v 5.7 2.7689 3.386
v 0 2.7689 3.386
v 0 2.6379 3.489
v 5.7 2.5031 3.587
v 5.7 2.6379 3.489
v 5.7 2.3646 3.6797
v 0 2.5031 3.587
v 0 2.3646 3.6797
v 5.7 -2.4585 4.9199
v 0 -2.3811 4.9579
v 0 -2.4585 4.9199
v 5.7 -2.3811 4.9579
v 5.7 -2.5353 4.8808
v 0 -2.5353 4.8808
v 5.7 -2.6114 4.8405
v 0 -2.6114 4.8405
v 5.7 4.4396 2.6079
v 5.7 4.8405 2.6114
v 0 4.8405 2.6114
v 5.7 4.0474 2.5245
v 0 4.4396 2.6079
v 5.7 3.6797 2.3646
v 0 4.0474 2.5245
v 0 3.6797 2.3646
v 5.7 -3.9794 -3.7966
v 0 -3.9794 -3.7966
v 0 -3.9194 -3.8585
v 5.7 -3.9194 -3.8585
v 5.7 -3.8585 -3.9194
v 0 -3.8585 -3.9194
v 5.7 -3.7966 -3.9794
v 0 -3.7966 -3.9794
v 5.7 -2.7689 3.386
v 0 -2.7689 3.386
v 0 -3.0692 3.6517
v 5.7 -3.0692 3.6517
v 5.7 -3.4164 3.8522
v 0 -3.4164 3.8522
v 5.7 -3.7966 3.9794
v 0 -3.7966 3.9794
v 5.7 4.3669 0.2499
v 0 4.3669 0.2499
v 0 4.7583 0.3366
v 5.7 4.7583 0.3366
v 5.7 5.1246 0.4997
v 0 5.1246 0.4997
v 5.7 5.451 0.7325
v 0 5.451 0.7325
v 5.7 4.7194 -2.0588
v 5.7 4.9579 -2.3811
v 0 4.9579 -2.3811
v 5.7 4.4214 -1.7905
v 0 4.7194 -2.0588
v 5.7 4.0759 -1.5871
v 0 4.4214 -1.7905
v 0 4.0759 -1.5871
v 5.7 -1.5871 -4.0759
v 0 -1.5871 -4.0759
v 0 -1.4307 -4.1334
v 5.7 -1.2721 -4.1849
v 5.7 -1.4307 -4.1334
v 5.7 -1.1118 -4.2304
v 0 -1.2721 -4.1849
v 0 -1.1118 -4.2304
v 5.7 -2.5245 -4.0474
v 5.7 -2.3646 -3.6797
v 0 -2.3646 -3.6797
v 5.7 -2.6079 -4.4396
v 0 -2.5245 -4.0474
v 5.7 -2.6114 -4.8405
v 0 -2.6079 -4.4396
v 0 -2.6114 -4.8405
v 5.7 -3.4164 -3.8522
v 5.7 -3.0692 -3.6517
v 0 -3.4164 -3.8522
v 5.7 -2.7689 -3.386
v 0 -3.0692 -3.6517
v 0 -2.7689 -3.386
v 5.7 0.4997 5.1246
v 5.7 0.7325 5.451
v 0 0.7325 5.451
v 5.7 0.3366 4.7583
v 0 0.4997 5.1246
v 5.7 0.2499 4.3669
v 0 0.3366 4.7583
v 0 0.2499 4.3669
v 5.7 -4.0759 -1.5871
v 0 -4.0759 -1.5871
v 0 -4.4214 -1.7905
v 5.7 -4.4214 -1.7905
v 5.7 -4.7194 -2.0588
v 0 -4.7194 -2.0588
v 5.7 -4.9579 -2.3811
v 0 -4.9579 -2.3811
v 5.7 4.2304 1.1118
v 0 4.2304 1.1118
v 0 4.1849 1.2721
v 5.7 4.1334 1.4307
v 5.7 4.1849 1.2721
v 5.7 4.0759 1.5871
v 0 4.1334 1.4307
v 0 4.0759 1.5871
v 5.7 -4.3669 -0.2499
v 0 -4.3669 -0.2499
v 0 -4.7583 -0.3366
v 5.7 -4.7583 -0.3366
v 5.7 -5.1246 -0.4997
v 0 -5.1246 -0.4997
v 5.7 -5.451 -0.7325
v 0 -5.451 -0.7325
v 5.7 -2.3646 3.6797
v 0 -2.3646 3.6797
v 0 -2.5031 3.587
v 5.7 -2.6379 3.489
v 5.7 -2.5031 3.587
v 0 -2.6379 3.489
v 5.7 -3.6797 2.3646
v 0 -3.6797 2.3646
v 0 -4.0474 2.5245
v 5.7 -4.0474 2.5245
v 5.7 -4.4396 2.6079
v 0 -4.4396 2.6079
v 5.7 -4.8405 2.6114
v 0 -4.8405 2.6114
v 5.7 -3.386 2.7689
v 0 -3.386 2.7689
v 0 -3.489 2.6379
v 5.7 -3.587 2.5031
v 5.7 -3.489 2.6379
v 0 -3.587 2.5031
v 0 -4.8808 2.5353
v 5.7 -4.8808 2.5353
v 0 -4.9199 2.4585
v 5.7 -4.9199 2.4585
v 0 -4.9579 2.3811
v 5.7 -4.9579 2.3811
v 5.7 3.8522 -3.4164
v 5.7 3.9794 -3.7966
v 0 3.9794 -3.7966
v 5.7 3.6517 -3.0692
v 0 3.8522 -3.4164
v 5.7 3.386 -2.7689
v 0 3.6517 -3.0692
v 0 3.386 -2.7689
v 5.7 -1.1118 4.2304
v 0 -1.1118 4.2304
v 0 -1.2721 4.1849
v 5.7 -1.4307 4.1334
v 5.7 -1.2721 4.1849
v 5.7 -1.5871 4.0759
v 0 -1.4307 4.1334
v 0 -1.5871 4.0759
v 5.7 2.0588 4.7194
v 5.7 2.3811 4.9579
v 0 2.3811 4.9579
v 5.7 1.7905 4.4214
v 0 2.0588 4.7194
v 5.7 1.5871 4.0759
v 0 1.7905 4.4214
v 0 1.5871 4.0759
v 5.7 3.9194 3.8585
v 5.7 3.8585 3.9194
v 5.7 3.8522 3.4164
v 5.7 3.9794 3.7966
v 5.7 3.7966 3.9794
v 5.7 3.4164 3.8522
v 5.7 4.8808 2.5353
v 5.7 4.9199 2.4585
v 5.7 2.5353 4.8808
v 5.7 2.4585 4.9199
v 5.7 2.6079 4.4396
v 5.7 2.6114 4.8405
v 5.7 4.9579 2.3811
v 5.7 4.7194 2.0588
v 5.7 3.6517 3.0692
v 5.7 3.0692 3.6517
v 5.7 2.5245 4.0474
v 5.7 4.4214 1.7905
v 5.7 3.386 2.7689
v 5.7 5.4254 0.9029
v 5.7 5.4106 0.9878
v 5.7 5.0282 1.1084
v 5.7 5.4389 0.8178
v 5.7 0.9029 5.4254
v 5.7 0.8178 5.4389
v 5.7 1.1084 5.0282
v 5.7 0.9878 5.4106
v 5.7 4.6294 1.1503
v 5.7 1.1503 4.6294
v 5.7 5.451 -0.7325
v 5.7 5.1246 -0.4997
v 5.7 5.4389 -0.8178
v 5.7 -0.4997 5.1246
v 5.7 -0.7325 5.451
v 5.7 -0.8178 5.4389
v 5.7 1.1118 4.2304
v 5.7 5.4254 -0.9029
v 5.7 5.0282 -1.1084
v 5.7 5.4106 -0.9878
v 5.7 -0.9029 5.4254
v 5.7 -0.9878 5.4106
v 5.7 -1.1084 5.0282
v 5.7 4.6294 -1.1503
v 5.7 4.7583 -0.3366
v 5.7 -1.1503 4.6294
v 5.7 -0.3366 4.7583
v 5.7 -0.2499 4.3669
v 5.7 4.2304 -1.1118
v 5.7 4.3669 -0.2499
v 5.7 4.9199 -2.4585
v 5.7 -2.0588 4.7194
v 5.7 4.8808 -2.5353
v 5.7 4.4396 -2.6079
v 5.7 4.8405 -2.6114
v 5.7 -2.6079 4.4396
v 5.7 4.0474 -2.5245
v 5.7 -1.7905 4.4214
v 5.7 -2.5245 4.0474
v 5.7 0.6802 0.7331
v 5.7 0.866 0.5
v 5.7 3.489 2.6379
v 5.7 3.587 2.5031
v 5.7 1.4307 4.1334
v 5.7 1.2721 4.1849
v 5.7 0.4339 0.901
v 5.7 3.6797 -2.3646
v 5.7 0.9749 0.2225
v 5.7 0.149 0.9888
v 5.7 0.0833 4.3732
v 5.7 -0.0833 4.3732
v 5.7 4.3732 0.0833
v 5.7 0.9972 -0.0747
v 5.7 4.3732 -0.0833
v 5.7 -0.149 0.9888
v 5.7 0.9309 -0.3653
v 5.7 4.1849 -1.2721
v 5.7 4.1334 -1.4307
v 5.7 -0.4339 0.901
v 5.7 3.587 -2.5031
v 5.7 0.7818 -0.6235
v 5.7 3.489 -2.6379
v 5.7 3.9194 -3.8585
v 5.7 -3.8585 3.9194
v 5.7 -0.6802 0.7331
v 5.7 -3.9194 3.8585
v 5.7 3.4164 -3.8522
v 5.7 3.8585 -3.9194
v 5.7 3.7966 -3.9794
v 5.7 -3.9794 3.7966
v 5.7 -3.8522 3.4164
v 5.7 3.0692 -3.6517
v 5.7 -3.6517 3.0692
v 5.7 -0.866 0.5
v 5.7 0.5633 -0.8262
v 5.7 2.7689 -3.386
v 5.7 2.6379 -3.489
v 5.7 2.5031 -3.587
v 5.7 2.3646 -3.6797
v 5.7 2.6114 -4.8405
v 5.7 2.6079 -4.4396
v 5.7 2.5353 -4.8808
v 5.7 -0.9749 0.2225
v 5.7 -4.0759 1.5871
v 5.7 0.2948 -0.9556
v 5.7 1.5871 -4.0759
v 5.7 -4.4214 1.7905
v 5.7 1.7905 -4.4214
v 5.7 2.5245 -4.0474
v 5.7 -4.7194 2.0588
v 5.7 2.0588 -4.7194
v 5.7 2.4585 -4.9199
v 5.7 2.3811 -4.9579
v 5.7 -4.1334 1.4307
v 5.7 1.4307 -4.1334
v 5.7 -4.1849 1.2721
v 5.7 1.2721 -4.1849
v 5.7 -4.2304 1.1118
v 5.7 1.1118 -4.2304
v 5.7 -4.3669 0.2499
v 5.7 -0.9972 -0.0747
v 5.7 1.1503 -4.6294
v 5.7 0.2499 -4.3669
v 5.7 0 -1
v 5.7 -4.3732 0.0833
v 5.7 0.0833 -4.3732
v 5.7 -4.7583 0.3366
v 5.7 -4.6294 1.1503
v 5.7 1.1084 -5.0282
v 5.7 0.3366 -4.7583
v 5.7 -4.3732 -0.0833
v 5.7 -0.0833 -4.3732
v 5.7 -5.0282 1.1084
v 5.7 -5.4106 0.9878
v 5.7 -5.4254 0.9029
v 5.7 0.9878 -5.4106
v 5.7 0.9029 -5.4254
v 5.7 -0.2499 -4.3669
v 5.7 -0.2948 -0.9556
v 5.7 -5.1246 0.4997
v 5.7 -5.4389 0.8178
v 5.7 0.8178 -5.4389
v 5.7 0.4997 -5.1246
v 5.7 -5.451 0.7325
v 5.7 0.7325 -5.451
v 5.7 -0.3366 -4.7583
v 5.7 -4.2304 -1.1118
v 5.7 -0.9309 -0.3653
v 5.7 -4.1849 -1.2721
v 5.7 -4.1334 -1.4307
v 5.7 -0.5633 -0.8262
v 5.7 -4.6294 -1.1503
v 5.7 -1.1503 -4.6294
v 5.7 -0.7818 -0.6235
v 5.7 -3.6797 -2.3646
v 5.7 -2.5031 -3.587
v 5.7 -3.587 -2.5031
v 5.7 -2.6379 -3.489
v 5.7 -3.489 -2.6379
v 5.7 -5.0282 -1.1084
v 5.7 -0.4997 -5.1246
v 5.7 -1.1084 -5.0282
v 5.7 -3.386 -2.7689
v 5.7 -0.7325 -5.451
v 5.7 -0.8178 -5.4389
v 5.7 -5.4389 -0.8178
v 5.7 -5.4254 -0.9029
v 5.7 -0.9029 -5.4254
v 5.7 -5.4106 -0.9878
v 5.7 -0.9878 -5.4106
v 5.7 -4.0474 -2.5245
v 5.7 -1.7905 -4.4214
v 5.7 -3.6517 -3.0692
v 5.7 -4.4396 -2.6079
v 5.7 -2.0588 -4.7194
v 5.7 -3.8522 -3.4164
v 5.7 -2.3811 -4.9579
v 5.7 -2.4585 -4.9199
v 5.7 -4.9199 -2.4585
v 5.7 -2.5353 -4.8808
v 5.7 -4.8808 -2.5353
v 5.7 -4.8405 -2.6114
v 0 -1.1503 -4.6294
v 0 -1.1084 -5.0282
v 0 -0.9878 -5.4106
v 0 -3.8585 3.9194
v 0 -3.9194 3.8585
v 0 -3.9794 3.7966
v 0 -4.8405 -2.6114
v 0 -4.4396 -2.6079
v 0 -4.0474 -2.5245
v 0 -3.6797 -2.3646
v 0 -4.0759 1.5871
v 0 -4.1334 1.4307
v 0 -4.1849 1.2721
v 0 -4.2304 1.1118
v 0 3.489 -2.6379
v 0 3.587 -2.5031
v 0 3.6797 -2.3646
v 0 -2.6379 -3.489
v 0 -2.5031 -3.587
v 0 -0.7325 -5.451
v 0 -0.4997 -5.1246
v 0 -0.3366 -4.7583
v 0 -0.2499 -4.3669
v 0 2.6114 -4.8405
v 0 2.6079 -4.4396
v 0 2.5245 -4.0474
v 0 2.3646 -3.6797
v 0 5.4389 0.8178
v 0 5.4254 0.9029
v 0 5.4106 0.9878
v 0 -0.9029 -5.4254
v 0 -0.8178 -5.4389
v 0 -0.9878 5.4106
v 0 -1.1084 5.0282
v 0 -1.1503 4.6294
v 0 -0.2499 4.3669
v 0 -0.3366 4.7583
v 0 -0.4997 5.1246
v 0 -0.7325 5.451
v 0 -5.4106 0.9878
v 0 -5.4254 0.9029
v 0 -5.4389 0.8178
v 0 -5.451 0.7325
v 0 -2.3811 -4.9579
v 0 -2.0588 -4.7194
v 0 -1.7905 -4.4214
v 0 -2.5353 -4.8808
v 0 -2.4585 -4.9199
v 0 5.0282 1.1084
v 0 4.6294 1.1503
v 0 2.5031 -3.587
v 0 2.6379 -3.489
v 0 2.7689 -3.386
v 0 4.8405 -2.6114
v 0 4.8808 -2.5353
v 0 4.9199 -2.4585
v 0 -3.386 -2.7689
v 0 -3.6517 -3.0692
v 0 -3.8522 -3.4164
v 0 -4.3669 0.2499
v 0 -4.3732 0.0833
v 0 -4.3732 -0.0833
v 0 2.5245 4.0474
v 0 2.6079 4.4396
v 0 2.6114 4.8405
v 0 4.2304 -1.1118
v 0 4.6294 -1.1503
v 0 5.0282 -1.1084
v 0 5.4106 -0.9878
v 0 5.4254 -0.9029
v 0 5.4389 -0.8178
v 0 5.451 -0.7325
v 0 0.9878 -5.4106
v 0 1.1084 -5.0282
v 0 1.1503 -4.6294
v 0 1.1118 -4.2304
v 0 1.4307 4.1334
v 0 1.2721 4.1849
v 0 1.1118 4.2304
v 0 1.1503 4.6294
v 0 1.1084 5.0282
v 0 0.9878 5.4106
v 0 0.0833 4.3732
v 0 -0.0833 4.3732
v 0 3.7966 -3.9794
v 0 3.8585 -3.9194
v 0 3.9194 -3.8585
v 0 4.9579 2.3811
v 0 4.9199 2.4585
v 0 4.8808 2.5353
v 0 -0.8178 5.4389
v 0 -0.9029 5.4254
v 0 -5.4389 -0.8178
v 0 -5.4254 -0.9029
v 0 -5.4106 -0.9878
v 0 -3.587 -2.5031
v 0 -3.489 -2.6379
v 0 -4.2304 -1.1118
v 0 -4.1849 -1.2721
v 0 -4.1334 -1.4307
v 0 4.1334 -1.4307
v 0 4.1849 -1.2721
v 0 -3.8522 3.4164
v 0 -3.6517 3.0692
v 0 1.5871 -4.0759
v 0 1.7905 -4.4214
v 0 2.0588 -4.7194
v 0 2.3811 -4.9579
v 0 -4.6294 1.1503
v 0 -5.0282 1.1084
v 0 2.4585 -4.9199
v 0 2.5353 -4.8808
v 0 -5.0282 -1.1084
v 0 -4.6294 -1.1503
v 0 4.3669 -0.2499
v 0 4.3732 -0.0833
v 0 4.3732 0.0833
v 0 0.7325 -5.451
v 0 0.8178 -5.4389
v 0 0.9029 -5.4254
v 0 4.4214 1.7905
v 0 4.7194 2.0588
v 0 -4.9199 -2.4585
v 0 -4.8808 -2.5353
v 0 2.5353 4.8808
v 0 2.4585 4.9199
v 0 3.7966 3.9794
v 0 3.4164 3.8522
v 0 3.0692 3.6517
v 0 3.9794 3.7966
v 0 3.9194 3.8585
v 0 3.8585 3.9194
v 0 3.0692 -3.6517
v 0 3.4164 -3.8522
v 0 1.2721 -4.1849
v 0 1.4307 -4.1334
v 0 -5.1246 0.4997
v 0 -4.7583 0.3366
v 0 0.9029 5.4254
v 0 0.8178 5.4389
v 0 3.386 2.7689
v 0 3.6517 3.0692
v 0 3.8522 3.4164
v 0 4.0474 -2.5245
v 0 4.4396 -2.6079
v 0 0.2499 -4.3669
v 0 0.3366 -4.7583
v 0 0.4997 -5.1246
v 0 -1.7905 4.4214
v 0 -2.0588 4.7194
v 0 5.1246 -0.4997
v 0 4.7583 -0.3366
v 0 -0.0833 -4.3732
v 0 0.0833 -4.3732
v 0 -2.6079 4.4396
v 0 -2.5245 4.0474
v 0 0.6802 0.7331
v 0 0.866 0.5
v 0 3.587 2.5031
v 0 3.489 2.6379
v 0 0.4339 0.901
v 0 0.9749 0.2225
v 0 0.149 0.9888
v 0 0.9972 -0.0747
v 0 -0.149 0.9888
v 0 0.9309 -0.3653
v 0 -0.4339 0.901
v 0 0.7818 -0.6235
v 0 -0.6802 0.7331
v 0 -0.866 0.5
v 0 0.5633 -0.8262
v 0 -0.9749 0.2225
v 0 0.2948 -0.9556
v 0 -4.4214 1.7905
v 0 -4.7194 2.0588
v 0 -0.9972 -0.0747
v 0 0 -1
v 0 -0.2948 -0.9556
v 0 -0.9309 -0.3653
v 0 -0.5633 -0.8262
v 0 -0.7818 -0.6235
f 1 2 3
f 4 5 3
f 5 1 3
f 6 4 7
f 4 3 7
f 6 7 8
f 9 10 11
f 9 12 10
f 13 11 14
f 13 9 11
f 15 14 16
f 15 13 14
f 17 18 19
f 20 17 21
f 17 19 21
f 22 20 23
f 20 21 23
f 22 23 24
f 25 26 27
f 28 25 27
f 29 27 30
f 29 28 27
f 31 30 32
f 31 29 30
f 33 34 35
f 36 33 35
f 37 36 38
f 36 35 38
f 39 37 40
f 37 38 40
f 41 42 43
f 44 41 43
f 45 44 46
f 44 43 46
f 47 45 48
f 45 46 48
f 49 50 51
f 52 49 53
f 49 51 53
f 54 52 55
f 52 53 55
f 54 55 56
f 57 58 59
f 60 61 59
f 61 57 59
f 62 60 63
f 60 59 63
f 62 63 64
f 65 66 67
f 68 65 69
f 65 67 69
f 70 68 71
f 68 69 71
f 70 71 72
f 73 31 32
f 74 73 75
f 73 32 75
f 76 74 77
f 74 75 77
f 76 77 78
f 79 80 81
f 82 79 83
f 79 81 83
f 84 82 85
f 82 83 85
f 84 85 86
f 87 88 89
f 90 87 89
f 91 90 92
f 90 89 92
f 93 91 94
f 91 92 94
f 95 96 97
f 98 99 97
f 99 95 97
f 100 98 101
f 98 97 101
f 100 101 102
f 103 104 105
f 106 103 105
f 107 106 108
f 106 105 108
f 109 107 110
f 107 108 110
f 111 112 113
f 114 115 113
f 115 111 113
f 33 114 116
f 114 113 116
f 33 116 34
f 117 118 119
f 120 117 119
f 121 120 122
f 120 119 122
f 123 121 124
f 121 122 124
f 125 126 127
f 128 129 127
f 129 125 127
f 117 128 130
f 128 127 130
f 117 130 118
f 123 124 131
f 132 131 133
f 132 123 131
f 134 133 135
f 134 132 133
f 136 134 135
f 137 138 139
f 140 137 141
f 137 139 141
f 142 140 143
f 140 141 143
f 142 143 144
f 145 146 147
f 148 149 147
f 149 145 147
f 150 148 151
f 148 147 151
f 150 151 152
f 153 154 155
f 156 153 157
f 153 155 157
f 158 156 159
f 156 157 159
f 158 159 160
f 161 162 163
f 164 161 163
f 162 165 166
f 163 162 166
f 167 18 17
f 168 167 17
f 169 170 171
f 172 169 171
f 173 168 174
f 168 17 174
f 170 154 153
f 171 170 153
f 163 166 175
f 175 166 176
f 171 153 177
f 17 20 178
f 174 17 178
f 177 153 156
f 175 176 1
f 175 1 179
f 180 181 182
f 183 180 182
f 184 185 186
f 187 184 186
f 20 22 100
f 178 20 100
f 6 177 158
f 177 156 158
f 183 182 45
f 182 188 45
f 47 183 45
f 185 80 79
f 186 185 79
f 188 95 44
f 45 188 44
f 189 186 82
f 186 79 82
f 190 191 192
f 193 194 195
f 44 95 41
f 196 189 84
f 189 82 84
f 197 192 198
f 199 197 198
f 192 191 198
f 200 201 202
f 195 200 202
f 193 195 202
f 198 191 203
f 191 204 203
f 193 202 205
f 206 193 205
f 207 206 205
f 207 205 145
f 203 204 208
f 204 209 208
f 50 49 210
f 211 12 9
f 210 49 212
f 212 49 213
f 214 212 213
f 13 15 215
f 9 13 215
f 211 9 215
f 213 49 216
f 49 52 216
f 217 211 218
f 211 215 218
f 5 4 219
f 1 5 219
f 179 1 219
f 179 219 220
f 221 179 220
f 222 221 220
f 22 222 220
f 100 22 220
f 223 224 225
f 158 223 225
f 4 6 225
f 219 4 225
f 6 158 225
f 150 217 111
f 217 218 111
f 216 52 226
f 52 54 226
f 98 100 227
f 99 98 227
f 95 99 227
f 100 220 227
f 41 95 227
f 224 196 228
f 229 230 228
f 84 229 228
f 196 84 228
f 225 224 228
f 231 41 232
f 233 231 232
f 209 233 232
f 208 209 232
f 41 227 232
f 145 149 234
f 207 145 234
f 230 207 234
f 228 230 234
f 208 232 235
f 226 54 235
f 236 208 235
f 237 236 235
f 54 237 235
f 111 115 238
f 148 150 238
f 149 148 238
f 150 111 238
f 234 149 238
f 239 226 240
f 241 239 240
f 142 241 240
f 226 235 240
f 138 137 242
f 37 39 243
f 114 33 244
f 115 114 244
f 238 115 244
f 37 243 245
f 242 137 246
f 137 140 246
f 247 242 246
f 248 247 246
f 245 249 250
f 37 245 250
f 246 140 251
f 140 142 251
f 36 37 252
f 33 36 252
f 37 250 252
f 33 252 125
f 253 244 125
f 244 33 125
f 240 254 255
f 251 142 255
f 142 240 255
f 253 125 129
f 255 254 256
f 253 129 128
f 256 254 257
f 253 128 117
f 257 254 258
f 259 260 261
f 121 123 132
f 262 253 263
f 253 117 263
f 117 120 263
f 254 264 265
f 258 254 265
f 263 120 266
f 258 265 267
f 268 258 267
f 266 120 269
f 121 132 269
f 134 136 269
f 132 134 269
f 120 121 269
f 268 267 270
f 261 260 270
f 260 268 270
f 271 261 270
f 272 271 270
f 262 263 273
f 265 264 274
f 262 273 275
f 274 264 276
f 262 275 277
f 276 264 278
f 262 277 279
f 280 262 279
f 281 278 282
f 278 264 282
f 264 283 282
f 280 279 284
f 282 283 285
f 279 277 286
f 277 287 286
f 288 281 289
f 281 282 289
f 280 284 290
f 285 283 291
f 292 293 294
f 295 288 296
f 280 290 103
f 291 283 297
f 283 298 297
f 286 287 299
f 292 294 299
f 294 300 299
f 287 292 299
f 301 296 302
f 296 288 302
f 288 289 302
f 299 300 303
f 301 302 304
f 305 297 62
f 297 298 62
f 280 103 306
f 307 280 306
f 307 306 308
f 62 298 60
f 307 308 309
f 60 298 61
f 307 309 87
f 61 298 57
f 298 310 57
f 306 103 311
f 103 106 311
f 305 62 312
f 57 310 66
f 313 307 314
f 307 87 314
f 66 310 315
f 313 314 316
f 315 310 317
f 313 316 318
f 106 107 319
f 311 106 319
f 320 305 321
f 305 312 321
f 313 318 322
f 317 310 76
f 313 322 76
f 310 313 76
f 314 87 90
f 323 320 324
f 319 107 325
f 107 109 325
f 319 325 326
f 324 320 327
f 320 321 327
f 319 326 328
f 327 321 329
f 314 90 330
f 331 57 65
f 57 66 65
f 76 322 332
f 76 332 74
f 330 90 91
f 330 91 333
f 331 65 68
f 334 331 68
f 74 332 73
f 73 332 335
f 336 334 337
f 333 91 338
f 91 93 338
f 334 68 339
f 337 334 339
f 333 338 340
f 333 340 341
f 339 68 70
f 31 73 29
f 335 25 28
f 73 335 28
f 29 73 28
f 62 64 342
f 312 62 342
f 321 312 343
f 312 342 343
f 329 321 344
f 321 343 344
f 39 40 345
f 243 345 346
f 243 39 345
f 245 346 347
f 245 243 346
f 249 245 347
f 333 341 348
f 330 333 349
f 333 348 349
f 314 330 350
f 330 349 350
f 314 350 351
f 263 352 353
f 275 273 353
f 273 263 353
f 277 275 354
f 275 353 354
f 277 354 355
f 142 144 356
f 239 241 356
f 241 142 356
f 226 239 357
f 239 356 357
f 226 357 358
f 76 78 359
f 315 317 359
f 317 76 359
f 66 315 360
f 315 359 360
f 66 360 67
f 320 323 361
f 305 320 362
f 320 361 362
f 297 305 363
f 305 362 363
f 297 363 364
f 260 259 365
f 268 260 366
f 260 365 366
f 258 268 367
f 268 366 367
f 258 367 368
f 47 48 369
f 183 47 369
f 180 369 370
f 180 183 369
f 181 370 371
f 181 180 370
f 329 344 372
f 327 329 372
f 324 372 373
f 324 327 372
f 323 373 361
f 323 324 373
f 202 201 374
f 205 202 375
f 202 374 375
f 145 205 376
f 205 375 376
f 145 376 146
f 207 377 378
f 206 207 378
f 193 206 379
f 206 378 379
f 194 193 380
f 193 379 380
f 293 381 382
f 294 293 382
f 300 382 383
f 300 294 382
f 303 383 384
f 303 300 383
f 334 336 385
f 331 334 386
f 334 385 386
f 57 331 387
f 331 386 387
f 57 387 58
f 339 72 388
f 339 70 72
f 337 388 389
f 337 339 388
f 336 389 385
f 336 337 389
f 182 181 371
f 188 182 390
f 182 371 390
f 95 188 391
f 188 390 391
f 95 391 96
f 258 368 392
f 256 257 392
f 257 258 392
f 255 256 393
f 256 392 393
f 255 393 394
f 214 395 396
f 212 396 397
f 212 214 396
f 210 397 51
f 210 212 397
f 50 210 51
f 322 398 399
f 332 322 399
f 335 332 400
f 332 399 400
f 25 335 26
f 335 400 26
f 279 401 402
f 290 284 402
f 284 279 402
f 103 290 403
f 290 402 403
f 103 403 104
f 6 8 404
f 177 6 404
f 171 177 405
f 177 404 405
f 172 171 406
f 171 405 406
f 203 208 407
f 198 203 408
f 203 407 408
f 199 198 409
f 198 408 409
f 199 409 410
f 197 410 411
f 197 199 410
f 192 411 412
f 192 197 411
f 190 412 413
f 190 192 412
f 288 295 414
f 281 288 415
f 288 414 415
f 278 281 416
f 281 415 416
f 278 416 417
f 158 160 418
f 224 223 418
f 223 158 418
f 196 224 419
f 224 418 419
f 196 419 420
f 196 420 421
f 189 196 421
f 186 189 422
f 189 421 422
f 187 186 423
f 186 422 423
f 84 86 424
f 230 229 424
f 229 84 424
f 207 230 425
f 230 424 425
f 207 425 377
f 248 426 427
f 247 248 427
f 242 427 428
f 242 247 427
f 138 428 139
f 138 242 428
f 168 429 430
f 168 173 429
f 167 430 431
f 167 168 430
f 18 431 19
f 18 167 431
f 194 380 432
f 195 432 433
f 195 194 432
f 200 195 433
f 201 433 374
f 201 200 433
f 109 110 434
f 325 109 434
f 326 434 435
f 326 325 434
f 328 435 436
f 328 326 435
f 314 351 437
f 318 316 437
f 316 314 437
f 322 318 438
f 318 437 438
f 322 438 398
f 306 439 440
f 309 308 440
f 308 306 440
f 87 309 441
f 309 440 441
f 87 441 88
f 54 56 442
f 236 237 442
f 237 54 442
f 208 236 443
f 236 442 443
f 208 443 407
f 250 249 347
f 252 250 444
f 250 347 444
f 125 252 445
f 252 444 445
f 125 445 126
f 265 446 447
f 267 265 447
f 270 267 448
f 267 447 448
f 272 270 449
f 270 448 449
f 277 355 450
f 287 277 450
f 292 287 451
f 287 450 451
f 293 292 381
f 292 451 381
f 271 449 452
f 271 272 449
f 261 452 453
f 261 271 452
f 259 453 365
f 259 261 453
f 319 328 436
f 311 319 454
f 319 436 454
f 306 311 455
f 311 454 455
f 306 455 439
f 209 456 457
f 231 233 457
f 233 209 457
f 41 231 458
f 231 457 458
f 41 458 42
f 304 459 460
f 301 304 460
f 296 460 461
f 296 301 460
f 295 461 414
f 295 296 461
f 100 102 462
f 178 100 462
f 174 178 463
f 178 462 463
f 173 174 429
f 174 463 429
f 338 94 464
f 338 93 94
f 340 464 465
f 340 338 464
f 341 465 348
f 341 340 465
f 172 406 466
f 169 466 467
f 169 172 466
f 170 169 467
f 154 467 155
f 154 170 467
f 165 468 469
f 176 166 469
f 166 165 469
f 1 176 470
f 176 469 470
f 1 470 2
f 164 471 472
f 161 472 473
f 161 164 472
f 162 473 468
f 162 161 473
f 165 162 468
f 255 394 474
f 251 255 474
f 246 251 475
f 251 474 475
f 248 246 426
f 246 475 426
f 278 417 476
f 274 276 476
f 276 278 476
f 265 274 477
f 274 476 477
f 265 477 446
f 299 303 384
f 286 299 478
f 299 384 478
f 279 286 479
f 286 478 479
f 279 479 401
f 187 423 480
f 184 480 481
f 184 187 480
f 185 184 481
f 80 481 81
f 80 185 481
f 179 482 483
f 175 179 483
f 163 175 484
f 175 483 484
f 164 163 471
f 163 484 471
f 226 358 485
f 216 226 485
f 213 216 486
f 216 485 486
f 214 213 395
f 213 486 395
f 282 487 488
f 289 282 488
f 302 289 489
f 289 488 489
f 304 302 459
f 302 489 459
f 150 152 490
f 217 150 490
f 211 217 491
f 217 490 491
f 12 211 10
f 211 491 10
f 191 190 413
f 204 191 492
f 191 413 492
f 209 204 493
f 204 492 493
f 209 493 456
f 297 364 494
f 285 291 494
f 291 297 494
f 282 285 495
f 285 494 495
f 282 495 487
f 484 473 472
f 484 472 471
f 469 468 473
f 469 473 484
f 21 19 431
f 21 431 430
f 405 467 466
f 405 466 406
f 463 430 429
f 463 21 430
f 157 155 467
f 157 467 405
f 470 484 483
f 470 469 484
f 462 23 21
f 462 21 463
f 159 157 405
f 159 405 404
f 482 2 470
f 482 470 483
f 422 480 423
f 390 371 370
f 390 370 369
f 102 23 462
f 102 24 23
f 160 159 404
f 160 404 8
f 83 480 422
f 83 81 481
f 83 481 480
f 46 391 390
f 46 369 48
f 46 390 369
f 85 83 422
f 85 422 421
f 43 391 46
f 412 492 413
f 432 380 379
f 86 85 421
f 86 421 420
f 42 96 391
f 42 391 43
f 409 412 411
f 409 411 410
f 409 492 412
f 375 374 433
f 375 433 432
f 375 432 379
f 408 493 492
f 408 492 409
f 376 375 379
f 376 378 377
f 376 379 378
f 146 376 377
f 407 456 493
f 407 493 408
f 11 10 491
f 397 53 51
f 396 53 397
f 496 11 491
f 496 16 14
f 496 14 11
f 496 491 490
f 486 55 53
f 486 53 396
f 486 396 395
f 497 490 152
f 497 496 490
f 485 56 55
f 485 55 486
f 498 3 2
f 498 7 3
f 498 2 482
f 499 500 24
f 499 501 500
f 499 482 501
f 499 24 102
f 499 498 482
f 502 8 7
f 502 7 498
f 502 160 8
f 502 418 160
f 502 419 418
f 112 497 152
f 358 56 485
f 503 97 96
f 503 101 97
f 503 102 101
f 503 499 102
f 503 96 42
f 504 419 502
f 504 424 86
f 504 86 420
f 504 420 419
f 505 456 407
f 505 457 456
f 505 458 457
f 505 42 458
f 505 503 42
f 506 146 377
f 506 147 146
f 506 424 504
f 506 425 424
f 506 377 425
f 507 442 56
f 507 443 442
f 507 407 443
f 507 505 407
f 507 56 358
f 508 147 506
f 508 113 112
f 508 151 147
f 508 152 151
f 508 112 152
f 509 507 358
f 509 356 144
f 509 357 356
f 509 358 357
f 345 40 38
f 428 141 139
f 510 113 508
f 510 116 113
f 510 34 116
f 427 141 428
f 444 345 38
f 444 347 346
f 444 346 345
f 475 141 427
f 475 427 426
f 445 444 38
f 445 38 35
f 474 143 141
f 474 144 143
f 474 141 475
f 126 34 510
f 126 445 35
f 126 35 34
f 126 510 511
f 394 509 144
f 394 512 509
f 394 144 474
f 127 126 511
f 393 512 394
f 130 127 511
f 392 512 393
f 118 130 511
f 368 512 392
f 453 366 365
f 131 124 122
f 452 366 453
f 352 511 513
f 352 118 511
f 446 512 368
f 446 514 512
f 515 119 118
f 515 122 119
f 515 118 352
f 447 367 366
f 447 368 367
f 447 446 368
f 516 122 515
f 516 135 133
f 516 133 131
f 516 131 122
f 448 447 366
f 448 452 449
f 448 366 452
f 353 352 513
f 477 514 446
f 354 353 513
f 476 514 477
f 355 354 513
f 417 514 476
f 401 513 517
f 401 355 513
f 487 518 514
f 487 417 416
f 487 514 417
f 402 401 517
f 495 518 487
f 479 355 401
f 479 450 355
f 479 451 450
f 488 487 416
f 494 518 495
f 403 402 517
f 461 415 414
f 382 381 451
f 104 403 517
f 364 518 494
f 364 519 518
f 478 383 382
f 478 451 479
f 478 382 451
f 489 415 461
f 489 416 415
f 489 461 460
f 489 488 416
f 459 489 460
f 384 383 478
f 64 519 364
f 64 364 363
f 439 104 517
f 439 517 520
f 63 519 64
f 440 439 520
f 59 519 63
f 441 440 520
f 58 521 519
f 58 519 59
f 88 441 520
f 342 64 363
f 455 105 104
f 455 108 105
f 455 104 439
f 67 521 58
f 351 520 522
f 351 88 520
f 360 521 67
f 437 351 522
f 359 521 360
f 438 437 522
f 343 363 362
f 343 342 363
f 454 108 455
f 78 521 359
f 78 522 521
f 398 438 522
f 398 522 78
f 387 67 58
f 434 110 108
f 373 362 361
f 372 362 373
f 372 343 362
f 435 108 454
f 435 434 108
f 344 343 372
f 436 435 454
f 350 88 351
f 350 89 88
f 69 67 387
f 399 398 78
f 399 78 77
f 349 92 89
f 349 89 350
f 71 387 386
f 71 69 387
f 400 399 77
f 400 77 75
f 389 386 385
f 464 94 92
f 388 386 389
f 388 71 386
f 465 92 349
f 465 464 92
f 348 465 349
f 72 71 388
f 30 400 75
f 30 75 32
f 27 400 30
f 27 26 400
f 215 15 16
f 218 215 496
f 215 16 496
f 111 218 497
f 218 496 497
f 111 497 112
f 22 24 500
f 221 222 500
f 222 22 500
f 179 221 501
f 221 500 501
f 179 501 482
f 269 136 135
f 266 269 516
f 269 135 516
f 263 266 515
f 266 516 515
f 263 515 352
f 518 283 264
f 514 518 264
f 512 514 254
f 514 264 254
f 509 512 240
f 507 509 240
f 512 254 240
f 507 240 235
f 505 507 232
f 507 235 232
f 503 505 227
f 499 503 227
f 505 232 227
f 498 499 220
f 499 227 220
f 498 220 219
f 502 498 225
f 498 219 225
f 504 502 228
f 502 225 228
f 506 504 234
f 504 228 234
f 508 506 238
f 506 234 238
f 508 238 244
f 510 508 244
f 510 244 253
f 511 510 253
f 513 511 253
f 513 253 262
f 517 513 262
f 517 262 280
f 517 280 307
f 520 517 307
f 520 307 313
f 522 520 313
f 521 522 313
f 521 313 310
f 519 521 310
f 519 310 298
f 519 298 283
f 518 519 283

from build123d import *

# Parameters (mm, degrees)
BASPROSKE_W         = 5.7
BASPROSKE_H         = 5.5
TOOTHCUT_DEPTH      = 10.643132271
TEETHCUTS_COUNT     = 20
TEETHCUTS_ANGLE     = 342
BORSKE_R            = 0.4
BORE_DEPTH          = 50.0000508
SKETCH_1_R          = 1
CUT_EXTRUDE_1_DEPTH = 10


with BuildPart() as part:
    # BasProSke → Base-Revolve (revolve)
    with BuildSketch(Plane(origin=(0, 0, 0), x_dir=(1, 0, 0), z_dir=(0, 1, 0)), mode=Mode.PRIVATE) as base_revolve_sk:
        with Locations((2.85, 2.75)):
            Rectangle(BASPROSKE_W, BASPROSKE_H)
    revolve(base_revolve_sk.sketch.rotate(Axis((-10, 0, 0), (1, 0, 0)), 180), axis=Axis((-10, 0, 0), (1, 0, 0)))

    # TooCutSke → ToothCut (cut, through all)
    with BuildSketch(Plane(origin=(0, 0, 0), x_dir=(0, 0, -1), z_dir=(1, 0, 0))):
        with BuildLine():
            ThreePointArc((0.249903181, 4.366855207), (0, 4.374), (-0.249903181, 4.366855207))
            ThreePointArc((-0.249903181, 4.366855207), (-0.415207844, 4.95951031), (-0.752843848, 5.473871692))
            ThreePointArc((-0.752843848, 5.473871692), (0, 5.5254), (0.752843848, 5.473871692))
            ThreePointArc((0.752843848, 5.473871692), (0.415207844, 4.95951031), (0.249903181, 4.366855207))
        make_face()
    toothcut = extrude(amount=TOOTHCUT_DEPTH, mode=Mode.SUBTRACT)

    # TeethCuts: ToothCut ×20 about axis
    teethcuts_axis = Axis((-10, 0, 0), (1, 0, 0))
    for i in range(1, TEETHCUTS_COUNT):
        add(toothcut.rotate(teethcuts_axis, i * TEETHCUTS_ANGLE / (TEETHCUTS_COUNT - 1)), mode=Mode.SUBTRACT)

    # BorSke → Bore (cut, symmetric)
    with BuildSketch(Plane(origin=(0, 0, 0), x_dir=(0, 0, -1), z_dir=(1, 0, 0))):
        with Locations(Location((0, 0, 0), (0, 0, 180))):
            Circle(BORSKE_R)
    extrude(amount=BORE_DEPTH, both=True, mode=Mode.SUBTRACT)

    # 草图1 → 切除-拉伸1 (cut)
    with BuildSketch(Plane(origin=(5.7, 0, 0), x_dir=(0, 0, -1), z_dir=(1, 0, 0))):
        Circle(SKETCH_1_R)
    extrude(amount=-CUT_EXTRUDE_1_DEPTH, mode=Mode.SUBTRACT)


solid = part.part
